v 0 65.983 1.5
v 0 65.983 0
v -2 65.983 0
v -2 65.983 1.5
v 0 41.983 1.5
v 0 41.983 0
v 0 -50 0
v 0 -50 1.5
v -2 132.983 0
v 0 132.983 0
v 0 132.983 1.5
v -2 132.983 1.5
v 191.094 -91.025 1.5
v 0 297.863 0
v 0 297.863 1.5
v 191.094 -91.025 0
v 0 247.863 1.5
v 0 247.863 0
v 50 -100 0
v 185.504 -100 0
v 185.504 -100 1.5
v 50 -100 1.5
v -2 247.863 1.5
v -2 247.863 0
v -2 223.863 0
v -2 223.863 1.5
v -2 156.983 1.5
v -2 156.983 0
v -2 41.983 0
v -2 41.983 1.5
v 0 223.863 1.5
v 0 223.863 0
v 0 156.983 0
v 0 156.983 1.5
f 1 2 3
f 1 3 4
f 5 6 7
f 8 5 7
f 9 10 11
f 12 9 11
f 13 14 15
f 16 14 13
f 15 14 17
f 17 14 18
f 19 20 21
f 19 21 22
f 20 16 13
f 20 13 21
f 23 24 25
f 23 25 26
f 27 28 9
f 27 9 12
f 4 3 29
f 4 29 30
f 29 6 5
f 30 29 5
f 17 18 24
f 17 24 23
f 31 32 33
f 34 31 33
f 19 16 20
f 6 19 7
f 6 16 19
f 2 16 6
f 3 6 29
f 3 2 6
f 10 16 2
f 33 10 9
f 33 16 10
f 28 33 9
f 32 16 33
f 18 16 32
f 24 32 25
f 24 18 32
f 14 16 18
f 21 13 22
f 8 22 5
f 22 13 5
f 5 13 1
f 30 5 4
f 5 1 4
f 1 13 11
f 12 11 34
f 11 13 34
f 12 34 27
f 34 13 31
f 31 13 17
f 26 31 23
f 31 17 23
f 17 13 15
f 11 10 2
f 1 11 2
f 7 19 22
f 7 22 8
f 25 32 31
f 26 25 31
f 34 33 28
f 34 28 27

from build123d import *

# Parameters (mm, degrees)
BOSS_EXTRUDE1_DEPTH = 1.5
SKETCH7_W           = 1.5
SKETCH7_H           = 24
BOSS_EXTRUDE3_DEPTH = 2


with BuildPart() as part:
    # Sketch1 → Boss-Extrude1 (new body)
    with BuildSketch(Plane.XY):
        Polygon((0, 0), (0, 297.863160558), (191.093722223, -91.025013327), (185.5038939, -100), (50, -100), (0, -50), align=None)
    extrude(amount=BOSS_EXTRUDE1_DEPTH)

    # Sketch7 → Boss-Extrude3 (add)
    with BuildSketch(Plane.ZY):
        with Locations((0.75, 235.863160558)):
            Rectangle(SKETCH7_W, SKETCH7_H)
        with Locations((0.75, 144.983352075)):
            Rectangle(SKETCH7_W, SKETCH7_H)
        with Locations((0.75, 53.983352075)):
            Rectangle(SKETCH7_W, SKETCH7_H)
    extrude(amount=BOSS_EXTRUDE3_DEPTH)


solid = part.part
